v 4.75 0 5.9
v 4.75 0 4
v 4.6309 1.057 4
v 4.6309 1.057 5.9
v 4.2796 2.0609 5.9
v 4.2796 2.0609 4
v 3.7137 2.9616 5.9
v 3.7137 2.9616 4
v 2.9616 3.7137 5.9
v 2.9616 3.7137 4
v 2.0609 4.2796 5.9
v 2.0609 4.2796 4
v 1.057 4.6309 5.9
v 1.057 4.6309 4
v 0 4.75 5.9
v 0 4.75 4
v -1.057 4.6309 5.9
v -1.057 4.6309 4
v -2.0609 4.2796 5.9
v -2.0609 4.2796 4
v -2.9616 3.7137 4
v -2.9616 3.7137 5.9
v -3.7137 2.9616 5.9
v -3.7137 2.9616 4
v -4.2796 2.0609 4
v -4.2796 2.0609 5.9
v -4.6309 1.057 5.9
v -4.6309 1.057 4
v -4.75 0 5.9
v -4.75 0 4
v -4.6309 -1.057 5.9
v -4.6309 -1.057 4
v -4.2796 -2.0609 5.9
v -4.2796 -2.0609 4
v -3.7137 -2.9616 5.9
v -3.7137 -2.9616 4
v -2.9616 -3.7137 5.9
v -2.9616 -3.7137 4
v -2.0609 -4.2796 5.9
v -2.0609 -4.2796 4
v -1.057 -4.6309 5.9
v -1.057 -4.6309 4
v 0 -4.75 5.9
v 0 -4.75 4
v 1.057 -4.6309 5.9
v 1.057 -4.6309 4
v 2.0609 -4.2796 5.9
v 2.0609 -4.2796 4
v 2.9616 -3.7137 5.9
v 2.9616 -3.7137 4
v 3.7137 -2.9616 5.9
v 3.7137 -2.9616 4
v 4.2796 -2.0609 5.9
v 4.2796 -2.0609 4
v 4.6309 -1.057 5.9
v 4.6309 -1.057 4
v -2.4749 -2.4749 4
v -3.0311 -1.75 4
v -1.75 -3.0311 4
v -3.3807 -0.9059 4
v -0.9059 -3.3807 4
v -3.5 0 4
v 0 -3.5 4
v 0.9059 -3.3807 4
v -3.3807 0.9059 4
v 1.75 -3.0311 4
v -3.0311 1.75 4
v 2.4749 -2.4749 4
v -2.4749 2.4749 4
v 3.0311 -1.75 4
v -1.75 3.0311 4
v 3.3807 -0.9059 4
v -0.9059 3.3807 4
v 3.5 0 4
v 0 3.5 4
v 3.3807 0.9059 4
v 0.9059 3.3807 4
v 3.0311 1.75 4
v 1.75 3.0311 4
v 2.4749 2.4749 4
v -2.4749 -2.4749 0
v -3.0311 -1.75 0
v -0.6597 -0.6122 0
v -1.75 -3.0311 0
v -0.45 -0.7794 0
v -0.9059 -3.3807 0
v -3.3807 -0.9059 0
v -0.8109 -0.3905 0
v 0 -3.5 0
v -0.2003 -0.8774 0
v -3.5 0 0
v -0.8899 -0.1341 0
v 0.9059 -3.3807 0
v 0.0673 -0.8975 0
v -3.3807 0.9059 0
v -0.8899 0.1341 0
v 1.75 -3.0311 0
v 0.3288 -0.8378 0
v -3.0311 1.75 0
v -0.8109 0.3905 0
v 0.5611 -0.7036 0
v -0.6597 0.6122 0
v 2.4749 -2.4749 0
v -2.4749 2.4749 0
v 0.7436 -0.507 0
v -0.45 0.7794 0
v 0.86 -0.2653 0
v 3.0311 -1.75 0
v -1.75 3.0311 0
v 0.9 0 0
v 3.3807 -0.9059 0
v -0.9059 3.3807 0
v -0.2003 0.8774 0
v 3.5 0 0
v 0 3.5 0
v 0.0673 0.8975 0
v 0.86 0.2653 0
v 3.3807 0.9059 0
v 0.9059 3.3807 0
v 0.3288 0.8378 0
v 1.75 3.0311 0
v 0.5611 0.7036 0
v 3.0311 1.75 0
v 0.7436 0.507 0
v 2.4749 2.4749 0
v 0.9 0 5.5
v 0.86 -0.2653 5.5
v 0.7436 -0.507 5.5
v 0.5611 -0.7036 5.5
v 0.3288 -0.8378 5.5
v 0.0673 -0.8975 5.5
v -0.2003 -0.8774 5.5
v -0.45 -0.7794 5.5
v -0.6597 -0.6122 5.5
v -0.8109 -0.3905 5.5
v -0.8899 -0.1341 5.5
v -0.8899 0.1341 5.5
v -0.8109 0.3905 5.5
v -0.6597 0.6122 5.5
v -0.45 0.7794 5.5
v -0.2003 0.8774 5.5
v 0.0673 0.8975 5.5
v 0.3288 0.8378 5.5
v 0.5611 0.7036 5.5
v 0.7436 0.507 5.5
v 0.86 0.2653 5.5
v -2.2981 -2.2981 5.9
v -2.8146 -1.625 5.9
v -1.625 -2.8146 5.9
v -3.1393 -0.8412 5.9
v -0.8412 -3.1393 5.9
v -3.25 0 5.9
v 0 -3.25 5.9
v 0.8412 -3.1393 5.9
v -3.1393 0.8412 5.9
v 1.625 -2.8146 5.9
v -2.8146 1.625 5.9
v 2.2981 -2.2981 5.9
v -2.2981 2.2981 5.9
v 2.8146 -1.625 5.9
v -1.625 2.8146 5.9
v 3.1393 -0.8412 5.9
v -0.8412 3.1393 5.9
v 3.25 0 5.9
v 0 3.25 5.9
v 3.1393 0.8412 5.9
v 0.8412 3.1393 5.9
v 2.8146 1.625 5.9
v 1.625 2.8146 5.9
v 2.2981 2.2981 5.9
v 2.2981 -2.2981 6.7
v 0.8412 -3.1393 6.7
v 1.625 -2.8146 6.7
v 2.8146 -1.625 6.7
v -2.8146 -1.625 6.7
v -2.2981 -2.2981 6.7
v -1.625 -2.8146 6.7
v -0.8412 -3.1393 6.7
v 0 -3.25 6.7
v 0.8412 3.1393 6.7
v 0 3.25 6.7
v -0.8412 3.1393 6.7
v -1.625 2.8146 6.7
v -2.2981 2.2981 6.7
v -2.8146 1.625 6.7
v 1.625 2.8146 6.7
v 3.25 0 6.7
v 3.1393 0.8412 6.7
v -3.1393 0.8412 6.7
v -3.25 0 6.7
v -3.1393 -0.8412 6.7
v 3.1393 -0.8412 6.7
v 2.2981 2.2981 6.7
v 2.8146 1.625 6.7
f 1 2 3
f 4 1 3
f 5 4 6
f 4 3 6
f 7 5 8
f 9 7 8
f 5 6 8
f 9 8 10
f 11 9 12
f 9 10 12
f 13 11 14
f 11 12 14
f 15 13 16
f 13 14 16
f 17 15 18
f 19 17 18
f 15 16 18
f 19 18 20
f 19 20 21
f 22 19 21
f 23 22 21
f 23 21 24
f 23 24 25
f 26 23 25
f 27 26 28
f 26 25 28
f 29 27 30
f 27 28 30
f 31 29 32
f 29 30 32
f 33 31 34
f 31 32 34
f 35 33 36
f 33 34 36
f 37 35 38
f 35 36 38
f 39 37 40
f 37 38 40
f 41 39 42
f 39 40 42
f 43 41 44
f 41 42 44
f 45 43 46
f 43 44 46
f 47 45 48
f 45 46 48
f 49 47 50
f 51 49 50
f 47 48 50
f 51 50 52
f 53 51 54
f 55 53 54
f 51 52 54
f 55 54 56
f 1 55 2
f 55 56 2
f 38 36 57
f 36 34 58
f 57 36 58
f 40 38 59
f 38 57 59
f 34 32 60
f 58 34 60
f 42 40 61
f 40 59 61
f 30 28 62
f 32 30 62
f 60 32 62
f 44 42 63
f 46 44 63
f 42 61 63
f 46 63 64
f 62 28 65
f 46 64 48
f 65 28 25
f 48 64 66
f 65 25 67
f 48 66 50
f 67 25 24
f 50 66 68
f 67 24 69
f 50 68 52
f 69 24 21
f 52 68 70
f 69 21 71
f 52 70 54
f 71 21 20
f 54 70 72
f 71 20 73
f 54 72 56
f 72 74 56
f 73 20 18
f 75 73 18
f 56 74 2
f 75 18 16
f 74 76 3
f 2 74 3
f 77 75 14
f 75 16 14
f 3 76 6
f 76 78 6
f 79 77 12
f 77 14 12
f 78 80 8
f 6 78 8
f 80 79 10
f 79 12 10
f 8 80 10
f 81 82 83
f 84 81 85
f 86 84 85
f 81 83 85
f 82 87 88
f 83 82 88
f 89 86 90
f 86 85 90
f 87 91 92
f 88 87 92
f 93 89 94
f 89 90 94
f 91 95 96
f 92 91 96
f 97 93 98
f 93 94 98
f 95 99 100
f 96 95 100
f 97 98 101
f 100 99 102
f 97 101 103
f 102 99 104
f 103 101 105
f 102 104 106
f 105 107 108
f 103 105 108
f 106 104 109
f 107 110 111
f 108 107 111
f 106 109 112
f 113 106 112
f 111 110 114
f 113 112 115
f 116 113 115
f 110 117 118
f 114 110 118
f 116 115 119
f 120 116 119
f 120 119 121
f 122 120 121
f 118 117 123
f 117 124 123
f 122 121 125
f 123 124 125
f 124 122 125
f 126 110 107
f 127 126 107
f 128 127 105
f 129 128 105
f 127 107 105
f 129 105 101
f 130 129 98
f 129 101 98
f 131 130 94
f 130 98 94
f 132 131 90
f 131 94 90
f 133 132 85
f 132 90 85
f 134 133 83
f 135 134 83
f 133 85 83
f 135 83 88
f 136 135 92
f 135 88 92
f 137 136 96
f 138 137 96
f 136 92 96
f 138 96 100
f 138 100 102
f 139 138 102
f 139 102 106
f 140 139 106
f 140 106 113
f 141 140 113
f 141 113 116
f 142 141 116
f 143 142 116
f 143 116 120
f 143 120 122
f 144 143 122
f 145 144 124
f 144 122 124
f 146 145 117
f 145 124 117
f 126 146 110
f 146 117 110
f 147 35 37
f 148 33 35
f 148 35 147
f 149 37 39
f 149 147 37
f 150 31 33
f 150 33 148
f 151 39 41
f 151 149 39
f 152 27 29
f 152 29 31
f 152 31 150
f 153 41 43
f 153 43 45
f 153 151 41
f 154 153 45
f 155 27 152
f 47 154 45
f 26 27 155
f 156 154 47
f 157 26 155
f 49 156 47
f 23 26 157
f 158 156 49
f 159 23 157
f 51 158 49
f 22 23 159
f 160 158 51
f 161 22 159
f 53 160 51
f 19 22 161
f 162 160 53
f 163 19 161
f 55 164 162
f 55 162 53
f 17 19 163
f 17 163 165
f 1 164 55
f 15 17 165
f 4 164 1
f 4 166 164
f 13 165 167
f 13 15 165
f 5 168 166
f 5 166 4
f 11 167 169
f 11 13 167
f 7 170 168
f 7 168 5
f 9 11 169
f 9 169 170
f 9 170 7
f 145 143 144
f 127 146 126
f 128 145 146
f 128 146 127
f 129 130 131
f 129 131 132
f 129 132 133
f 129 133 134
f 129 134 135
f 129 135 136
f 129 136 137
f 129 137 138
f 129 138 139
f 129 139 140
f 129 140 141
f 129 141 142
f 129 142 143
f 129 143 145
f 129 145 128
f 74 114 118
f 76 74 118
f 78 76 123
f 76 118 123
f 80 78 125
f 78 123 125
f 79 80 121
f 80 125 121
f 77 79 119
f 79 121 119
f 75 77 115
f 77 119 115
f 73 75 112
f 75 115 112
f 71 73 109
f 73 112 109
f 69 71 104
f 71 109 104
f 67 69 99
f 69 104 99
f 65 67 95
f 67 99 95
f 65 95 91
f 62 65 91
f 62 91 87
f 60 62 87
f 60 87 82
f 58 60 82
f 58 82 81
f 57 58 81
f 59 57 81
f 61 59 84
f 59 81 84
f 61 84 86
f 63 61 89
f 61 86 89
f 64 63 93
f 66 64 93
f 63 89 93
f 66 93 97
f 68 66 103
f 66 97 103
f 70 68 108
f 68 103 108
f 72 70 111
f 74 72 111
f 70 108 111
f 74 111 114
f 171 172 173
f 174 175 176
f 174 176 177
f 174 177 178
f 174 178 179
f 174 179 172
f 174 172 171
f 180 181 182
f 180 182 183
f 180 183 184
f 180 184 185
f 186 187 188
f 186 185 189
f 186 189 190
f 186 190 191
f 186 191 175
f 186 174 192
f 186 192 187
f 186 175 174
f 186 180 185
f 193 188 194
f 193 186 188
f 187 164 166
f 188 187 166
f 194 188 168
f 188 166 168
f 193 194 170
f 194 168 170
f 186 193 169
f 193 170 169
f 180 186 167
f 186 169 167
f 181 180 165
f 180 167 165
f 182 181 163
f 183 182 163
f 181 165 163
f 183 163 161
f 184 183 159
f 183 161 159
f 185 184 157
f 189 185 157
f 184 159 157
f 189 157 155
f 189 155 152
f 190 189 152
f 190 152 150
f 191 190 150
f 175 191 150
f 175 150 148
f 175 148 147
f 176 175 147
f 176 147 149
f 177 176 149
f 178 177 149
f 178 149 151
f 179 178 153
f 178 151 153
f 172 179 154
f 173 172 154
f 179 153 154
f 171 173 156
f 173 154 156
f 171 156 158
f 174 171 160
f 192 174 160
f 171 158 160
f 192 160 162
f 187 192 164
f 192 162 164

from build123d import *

# Parameters (mm, degrees)
F0_R     = 3.5
F1_DEPTH = 4
F2_R     = 4.75
F2_R_2   = 3.5
F3_DEPTH = 1.9
F4_R     = 3.25
F5_DEPTH = 0.8
F6_R     = 0.9
F7_DEPTH = 5.5


with BuildPart() as f1:
    # F0 (on Top) → F1 (new body)
    with BuildSketch(Plane.XY):
        Circle(F0_R)
    extrude(amount=F1_DEPTH)

    # F2 (on face) → F3 (join)
    with BuildSketch(Plane.XY.offset(4)):
        Circle(F2_R)
        Circle(F2_R_2, mode=Mode.SUBTRACT)
        Circle(F2_R_2)
    extrude(amount=F3_DEPTH)

    # F4 (on face) → F5 (join)
    with BuildSketch(Plane.XY.offset(5.9)):
        Circle(F4_R)
    extrude(amount=F5_DEPTH)

    # F6 (on face) → F7 (cut)
    with BuildSketch(Plane(origin=(0, 0, 0), x_dir=(1, 0, 0), z_dir=(0, 0, -1))):
        Circle(F6_R)
    extrude(amount=-F7_DEPTH, mode=Mode.SUBTRACT)


solid = f1.part
